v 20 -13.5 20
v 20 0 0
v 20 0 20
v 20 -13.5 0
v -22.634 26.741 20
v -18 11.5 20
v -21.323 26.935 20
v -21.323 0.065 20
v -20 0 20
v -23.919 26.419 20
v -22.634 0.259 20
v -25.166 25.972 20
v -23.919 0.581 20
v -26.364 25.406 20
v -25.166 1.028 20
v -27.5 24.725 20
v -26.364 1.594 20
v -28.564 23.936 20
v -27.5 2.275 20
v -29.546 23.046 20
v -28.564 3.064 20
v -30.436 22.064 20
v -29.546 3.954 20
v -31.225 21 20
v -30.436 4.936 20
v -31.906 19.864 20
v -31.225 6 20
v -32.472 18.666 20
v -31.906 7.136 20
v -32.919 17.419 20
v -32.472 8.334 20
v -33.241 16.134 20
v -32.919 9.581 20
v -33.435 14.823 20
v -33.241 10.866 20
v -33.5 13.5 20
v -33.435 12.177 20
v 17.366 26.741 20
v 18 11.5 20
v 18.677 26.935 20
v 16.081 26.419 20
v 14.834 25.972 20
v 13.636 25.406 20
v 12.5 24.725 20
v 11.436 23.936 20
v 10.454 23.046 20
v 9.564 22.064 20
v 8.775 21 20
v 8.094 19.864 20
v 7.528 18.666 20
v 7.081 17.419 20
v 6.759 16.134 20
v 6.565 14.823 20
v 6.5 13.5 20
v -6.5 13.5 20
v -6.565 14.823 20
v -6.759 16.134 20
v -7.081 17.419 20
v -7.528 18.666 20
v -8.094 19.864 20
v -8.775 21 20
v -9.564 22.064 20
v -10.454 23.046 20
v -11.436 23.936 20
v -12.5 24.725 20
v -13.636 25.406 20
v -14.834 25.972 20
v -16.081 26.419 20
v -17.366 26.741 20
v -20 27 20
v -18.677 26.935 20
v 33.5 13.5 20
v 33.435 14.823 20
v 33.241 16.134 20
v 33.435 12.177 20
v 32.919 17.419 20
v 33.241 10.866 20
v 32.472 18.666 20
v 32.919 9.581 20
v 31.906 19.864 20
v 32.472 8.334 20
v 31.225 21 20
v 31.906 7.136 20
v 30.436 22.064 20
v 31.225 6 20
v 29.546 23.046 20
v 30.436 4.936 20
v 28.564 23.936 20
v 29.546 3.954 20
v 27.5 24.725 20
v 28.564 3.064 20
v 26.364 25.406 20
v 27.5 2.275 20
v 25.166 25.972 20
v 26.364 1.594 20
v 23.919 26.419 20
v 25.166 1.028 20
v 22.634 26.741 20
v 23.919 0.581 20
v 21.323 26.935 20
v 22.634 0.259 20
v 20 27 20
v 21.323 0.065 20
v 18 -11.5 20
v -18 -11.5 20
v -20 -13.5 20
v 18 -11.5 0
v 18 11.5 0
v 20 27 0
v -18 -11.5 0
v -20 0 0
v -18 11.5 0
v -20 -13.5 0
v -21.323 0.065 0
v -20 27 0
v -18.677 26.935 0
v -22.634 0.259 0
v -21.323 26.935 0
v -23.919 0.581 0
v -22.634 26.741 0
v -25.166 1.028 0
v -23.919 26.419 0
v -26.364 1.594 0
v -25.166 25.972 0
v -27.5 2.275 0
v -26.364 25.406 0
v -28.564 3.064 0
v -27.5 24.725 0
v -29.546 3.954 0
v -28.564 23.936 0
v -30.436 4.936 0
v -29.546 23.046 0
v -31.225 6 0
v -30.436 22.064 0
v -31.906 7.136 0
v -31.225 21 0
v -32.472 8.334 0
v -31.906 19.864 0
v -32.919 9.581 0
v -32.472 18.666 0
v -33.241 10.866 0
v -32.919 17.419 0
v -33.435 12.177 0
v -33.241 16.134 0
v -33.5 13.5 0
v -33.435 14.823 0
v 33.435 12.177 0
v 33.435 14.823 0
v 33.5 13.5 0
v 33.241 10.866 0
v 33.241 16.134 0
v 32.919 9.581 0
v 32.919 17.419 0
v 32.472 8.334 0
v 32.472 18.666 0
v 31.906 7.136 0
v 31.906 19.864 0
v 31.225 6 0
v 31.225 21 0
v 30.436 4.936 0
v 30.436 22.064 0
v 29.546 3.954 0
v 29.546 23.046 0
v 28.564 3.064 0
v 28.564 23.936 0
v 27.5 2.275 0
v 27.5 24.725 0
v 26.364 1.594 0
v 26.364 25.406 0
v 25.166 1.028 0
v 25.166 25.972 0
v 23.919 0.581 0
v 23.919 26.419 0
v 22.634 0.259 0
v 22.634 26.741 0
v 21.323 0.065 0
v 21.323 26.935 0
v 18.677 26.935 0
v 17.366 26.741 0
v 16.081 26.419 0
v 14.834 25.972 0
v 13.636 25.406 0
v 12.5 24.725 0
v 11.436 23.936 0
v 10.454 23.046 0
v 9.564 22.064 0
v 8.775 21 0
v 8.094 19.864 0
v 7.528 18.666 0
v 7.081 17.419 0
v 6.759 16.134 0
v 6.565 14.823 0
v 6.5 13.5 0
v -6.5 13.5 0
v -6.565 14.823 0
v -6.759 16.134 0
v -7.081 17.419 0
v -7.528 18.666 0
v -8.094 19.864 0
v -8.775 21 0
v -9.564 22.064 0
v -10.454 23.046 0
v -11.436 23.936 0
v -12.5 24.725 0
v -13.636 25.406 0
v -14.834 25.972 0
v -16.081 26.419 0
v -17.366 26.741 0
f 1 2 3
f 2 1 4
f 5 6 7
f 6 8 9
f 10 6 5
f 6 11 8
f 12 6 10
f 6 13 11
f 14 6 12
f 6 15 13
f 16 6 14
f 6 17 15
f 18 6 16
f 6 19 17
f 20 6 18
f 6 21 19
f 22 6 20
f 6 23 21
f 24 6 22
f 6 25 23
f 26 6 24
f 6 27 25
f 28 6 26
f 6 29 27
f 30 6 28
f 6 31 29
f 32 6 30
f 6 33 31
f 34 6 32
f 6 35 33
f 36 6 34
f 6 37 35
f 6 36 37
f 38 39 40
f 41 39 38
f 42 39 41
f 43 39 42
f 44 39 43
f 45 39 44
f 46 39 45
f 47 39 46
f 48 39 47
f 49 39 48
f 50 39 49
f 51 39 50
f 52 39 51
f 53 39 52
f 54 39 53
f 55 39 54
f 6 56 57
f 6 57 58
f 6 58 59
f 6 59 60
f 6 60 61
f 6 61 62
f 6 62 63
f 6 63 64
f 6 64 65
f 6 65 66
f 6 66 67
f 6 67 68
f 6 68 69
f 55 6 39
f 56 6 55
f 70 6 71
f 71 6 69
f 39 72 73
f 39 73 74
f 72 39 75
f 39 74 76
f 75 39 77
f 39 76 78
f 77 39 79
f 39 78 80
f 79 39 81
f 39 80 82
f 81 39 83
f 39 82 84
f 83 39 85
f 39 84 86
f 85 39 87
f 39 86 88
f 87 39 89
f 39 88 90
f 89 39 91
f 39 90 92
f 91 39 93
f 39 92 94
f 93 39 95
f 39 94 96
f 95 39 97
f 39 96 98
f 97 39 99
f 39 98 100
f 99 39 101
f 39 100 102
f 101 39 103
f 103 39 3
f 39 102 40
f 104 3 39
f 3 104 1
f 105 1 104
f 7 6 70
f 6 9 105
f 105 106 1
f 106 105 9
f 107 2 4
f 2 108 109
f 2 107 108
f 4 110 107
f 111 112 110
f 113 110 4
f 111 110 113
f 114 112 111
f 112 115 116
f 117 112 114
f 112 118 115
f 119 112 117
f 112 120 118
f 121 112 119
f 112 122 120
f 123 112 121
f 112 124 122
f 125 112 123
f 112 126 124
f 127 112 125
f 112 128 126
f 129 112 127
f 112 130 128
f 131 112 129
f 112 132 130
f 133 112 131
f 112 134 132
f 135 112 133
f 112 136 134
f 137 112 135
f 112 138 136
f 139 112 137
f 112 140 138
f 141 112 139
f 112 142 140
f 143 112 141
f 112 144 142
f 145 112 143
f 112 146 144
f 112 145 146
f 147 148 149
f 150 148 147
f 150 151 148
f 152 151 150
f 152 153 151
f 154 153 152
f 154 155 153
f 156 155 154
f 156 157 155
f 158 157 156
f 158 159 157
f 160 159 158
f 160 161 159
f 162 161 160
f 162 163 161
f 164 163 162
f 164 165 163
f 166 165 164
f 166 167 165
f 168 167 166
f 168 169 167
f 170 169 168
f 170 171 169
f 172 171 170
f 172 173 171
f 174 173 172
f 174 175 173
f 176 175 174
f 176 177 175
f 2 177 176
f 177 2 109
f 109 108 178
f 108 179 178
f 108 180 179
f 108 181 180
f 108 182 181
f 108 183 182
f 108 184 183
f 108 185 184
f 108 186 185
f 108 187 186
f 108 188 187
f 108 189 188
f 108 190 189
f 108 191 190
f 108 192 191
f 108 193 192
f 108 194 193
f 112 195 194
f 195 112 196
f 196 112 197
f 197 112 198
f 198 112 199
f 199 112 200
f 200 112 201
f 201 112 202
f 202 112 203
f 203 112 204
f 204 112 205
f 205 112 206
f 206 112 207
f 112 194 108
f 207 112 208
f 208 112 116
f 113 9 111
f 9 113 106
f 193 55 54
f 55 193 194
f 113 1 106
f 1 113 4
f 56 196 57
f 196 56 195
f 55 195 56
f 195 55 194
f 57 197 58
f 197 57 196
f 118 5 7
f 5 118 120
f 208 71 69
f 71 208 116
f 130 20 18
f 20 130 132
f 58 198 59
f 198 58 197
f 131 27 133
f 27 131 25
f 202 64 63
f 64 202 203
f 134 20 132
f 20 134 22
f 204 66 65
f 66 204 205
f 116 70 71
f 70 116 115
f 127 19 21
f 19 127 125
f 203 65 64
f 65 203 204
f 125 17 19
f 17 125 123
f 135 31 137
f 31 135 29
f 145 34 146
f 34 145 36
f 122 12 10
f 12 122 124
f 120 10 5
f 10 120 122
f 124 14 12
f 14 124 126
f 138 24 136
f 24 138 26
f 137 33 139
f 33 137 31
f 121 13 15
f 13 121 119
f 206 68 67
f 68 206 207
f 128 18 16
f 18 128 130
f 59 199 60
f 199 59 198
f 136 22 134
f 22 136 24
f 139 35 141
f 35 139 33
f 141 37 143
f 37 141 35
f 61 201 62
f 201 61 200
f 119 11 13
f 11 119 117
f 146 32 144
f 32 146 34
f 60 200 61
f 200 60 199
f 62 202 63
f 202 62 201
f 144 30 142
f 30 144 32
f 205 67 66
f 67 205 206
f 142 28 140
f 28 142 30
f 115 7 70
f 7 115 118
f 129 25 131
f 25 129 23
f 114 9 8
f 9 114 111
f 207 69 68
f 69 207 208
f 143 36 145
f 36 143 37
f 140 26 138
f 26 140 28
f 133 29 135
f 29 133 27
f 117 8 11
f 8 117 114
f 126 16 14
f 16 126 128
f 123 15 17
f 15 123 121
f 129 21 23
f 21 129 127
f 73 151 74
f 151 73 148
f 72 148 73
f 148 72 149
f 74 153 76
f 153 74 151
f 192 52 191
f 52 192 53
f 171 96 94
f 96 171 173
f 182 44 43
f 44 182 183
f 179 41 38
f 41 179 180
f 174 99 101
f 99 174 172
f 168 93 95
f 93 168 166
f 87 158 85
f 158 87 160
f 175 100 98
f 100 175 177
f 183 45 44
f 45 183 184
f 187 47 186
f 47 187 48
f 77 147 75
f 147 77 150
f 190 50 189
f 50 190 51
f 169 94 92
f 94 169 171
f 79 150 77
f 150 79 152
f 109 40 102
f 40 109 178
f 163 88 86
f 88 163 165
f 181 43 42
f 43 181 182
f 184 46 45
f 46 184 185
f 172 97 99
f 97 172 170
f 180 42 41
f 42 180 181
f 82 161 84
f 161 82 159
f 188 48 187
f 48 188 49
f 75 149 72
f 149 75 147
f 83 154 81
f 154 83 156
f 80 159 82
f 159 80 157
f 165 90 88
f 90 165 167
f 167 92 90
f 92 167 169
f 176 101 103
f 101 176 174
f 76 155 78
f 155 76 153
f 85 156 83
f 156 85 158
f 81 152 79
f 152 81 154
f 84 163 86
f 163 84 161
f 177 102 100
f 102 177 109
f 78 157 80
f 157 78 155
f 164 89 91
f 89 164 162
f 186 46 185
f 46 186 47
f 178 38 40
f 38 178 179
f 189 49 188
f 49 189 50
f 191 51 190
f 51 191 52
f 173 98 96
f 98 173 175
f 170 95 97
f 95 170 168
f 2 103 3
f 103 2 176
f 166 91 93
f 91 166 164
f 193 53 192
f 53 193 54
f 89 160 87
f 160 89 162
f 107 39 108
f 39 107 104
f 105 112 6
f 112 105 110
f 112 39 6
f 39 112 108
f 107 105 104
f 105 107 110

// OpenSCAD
module iec_inlet() {
    difference() {
        // Main body
        union() {
            // Main rectangular body
            translate([-20, -13.5, 0])
                cube([40, 27, 20]);
            // Top rounded corners
            translate([-20, 13.5, 0])
                cylinder(h=20, r=13.5, $fn=64);
            translate([20, 13.5, 0])
                cylinder(h=20, r=13.5, $fn=64);
        }
        // Cut out the inner part
        translate([-18, -11.5, -1])
            cube([36, 23, 22]);
    }
}

iec_inlet();
